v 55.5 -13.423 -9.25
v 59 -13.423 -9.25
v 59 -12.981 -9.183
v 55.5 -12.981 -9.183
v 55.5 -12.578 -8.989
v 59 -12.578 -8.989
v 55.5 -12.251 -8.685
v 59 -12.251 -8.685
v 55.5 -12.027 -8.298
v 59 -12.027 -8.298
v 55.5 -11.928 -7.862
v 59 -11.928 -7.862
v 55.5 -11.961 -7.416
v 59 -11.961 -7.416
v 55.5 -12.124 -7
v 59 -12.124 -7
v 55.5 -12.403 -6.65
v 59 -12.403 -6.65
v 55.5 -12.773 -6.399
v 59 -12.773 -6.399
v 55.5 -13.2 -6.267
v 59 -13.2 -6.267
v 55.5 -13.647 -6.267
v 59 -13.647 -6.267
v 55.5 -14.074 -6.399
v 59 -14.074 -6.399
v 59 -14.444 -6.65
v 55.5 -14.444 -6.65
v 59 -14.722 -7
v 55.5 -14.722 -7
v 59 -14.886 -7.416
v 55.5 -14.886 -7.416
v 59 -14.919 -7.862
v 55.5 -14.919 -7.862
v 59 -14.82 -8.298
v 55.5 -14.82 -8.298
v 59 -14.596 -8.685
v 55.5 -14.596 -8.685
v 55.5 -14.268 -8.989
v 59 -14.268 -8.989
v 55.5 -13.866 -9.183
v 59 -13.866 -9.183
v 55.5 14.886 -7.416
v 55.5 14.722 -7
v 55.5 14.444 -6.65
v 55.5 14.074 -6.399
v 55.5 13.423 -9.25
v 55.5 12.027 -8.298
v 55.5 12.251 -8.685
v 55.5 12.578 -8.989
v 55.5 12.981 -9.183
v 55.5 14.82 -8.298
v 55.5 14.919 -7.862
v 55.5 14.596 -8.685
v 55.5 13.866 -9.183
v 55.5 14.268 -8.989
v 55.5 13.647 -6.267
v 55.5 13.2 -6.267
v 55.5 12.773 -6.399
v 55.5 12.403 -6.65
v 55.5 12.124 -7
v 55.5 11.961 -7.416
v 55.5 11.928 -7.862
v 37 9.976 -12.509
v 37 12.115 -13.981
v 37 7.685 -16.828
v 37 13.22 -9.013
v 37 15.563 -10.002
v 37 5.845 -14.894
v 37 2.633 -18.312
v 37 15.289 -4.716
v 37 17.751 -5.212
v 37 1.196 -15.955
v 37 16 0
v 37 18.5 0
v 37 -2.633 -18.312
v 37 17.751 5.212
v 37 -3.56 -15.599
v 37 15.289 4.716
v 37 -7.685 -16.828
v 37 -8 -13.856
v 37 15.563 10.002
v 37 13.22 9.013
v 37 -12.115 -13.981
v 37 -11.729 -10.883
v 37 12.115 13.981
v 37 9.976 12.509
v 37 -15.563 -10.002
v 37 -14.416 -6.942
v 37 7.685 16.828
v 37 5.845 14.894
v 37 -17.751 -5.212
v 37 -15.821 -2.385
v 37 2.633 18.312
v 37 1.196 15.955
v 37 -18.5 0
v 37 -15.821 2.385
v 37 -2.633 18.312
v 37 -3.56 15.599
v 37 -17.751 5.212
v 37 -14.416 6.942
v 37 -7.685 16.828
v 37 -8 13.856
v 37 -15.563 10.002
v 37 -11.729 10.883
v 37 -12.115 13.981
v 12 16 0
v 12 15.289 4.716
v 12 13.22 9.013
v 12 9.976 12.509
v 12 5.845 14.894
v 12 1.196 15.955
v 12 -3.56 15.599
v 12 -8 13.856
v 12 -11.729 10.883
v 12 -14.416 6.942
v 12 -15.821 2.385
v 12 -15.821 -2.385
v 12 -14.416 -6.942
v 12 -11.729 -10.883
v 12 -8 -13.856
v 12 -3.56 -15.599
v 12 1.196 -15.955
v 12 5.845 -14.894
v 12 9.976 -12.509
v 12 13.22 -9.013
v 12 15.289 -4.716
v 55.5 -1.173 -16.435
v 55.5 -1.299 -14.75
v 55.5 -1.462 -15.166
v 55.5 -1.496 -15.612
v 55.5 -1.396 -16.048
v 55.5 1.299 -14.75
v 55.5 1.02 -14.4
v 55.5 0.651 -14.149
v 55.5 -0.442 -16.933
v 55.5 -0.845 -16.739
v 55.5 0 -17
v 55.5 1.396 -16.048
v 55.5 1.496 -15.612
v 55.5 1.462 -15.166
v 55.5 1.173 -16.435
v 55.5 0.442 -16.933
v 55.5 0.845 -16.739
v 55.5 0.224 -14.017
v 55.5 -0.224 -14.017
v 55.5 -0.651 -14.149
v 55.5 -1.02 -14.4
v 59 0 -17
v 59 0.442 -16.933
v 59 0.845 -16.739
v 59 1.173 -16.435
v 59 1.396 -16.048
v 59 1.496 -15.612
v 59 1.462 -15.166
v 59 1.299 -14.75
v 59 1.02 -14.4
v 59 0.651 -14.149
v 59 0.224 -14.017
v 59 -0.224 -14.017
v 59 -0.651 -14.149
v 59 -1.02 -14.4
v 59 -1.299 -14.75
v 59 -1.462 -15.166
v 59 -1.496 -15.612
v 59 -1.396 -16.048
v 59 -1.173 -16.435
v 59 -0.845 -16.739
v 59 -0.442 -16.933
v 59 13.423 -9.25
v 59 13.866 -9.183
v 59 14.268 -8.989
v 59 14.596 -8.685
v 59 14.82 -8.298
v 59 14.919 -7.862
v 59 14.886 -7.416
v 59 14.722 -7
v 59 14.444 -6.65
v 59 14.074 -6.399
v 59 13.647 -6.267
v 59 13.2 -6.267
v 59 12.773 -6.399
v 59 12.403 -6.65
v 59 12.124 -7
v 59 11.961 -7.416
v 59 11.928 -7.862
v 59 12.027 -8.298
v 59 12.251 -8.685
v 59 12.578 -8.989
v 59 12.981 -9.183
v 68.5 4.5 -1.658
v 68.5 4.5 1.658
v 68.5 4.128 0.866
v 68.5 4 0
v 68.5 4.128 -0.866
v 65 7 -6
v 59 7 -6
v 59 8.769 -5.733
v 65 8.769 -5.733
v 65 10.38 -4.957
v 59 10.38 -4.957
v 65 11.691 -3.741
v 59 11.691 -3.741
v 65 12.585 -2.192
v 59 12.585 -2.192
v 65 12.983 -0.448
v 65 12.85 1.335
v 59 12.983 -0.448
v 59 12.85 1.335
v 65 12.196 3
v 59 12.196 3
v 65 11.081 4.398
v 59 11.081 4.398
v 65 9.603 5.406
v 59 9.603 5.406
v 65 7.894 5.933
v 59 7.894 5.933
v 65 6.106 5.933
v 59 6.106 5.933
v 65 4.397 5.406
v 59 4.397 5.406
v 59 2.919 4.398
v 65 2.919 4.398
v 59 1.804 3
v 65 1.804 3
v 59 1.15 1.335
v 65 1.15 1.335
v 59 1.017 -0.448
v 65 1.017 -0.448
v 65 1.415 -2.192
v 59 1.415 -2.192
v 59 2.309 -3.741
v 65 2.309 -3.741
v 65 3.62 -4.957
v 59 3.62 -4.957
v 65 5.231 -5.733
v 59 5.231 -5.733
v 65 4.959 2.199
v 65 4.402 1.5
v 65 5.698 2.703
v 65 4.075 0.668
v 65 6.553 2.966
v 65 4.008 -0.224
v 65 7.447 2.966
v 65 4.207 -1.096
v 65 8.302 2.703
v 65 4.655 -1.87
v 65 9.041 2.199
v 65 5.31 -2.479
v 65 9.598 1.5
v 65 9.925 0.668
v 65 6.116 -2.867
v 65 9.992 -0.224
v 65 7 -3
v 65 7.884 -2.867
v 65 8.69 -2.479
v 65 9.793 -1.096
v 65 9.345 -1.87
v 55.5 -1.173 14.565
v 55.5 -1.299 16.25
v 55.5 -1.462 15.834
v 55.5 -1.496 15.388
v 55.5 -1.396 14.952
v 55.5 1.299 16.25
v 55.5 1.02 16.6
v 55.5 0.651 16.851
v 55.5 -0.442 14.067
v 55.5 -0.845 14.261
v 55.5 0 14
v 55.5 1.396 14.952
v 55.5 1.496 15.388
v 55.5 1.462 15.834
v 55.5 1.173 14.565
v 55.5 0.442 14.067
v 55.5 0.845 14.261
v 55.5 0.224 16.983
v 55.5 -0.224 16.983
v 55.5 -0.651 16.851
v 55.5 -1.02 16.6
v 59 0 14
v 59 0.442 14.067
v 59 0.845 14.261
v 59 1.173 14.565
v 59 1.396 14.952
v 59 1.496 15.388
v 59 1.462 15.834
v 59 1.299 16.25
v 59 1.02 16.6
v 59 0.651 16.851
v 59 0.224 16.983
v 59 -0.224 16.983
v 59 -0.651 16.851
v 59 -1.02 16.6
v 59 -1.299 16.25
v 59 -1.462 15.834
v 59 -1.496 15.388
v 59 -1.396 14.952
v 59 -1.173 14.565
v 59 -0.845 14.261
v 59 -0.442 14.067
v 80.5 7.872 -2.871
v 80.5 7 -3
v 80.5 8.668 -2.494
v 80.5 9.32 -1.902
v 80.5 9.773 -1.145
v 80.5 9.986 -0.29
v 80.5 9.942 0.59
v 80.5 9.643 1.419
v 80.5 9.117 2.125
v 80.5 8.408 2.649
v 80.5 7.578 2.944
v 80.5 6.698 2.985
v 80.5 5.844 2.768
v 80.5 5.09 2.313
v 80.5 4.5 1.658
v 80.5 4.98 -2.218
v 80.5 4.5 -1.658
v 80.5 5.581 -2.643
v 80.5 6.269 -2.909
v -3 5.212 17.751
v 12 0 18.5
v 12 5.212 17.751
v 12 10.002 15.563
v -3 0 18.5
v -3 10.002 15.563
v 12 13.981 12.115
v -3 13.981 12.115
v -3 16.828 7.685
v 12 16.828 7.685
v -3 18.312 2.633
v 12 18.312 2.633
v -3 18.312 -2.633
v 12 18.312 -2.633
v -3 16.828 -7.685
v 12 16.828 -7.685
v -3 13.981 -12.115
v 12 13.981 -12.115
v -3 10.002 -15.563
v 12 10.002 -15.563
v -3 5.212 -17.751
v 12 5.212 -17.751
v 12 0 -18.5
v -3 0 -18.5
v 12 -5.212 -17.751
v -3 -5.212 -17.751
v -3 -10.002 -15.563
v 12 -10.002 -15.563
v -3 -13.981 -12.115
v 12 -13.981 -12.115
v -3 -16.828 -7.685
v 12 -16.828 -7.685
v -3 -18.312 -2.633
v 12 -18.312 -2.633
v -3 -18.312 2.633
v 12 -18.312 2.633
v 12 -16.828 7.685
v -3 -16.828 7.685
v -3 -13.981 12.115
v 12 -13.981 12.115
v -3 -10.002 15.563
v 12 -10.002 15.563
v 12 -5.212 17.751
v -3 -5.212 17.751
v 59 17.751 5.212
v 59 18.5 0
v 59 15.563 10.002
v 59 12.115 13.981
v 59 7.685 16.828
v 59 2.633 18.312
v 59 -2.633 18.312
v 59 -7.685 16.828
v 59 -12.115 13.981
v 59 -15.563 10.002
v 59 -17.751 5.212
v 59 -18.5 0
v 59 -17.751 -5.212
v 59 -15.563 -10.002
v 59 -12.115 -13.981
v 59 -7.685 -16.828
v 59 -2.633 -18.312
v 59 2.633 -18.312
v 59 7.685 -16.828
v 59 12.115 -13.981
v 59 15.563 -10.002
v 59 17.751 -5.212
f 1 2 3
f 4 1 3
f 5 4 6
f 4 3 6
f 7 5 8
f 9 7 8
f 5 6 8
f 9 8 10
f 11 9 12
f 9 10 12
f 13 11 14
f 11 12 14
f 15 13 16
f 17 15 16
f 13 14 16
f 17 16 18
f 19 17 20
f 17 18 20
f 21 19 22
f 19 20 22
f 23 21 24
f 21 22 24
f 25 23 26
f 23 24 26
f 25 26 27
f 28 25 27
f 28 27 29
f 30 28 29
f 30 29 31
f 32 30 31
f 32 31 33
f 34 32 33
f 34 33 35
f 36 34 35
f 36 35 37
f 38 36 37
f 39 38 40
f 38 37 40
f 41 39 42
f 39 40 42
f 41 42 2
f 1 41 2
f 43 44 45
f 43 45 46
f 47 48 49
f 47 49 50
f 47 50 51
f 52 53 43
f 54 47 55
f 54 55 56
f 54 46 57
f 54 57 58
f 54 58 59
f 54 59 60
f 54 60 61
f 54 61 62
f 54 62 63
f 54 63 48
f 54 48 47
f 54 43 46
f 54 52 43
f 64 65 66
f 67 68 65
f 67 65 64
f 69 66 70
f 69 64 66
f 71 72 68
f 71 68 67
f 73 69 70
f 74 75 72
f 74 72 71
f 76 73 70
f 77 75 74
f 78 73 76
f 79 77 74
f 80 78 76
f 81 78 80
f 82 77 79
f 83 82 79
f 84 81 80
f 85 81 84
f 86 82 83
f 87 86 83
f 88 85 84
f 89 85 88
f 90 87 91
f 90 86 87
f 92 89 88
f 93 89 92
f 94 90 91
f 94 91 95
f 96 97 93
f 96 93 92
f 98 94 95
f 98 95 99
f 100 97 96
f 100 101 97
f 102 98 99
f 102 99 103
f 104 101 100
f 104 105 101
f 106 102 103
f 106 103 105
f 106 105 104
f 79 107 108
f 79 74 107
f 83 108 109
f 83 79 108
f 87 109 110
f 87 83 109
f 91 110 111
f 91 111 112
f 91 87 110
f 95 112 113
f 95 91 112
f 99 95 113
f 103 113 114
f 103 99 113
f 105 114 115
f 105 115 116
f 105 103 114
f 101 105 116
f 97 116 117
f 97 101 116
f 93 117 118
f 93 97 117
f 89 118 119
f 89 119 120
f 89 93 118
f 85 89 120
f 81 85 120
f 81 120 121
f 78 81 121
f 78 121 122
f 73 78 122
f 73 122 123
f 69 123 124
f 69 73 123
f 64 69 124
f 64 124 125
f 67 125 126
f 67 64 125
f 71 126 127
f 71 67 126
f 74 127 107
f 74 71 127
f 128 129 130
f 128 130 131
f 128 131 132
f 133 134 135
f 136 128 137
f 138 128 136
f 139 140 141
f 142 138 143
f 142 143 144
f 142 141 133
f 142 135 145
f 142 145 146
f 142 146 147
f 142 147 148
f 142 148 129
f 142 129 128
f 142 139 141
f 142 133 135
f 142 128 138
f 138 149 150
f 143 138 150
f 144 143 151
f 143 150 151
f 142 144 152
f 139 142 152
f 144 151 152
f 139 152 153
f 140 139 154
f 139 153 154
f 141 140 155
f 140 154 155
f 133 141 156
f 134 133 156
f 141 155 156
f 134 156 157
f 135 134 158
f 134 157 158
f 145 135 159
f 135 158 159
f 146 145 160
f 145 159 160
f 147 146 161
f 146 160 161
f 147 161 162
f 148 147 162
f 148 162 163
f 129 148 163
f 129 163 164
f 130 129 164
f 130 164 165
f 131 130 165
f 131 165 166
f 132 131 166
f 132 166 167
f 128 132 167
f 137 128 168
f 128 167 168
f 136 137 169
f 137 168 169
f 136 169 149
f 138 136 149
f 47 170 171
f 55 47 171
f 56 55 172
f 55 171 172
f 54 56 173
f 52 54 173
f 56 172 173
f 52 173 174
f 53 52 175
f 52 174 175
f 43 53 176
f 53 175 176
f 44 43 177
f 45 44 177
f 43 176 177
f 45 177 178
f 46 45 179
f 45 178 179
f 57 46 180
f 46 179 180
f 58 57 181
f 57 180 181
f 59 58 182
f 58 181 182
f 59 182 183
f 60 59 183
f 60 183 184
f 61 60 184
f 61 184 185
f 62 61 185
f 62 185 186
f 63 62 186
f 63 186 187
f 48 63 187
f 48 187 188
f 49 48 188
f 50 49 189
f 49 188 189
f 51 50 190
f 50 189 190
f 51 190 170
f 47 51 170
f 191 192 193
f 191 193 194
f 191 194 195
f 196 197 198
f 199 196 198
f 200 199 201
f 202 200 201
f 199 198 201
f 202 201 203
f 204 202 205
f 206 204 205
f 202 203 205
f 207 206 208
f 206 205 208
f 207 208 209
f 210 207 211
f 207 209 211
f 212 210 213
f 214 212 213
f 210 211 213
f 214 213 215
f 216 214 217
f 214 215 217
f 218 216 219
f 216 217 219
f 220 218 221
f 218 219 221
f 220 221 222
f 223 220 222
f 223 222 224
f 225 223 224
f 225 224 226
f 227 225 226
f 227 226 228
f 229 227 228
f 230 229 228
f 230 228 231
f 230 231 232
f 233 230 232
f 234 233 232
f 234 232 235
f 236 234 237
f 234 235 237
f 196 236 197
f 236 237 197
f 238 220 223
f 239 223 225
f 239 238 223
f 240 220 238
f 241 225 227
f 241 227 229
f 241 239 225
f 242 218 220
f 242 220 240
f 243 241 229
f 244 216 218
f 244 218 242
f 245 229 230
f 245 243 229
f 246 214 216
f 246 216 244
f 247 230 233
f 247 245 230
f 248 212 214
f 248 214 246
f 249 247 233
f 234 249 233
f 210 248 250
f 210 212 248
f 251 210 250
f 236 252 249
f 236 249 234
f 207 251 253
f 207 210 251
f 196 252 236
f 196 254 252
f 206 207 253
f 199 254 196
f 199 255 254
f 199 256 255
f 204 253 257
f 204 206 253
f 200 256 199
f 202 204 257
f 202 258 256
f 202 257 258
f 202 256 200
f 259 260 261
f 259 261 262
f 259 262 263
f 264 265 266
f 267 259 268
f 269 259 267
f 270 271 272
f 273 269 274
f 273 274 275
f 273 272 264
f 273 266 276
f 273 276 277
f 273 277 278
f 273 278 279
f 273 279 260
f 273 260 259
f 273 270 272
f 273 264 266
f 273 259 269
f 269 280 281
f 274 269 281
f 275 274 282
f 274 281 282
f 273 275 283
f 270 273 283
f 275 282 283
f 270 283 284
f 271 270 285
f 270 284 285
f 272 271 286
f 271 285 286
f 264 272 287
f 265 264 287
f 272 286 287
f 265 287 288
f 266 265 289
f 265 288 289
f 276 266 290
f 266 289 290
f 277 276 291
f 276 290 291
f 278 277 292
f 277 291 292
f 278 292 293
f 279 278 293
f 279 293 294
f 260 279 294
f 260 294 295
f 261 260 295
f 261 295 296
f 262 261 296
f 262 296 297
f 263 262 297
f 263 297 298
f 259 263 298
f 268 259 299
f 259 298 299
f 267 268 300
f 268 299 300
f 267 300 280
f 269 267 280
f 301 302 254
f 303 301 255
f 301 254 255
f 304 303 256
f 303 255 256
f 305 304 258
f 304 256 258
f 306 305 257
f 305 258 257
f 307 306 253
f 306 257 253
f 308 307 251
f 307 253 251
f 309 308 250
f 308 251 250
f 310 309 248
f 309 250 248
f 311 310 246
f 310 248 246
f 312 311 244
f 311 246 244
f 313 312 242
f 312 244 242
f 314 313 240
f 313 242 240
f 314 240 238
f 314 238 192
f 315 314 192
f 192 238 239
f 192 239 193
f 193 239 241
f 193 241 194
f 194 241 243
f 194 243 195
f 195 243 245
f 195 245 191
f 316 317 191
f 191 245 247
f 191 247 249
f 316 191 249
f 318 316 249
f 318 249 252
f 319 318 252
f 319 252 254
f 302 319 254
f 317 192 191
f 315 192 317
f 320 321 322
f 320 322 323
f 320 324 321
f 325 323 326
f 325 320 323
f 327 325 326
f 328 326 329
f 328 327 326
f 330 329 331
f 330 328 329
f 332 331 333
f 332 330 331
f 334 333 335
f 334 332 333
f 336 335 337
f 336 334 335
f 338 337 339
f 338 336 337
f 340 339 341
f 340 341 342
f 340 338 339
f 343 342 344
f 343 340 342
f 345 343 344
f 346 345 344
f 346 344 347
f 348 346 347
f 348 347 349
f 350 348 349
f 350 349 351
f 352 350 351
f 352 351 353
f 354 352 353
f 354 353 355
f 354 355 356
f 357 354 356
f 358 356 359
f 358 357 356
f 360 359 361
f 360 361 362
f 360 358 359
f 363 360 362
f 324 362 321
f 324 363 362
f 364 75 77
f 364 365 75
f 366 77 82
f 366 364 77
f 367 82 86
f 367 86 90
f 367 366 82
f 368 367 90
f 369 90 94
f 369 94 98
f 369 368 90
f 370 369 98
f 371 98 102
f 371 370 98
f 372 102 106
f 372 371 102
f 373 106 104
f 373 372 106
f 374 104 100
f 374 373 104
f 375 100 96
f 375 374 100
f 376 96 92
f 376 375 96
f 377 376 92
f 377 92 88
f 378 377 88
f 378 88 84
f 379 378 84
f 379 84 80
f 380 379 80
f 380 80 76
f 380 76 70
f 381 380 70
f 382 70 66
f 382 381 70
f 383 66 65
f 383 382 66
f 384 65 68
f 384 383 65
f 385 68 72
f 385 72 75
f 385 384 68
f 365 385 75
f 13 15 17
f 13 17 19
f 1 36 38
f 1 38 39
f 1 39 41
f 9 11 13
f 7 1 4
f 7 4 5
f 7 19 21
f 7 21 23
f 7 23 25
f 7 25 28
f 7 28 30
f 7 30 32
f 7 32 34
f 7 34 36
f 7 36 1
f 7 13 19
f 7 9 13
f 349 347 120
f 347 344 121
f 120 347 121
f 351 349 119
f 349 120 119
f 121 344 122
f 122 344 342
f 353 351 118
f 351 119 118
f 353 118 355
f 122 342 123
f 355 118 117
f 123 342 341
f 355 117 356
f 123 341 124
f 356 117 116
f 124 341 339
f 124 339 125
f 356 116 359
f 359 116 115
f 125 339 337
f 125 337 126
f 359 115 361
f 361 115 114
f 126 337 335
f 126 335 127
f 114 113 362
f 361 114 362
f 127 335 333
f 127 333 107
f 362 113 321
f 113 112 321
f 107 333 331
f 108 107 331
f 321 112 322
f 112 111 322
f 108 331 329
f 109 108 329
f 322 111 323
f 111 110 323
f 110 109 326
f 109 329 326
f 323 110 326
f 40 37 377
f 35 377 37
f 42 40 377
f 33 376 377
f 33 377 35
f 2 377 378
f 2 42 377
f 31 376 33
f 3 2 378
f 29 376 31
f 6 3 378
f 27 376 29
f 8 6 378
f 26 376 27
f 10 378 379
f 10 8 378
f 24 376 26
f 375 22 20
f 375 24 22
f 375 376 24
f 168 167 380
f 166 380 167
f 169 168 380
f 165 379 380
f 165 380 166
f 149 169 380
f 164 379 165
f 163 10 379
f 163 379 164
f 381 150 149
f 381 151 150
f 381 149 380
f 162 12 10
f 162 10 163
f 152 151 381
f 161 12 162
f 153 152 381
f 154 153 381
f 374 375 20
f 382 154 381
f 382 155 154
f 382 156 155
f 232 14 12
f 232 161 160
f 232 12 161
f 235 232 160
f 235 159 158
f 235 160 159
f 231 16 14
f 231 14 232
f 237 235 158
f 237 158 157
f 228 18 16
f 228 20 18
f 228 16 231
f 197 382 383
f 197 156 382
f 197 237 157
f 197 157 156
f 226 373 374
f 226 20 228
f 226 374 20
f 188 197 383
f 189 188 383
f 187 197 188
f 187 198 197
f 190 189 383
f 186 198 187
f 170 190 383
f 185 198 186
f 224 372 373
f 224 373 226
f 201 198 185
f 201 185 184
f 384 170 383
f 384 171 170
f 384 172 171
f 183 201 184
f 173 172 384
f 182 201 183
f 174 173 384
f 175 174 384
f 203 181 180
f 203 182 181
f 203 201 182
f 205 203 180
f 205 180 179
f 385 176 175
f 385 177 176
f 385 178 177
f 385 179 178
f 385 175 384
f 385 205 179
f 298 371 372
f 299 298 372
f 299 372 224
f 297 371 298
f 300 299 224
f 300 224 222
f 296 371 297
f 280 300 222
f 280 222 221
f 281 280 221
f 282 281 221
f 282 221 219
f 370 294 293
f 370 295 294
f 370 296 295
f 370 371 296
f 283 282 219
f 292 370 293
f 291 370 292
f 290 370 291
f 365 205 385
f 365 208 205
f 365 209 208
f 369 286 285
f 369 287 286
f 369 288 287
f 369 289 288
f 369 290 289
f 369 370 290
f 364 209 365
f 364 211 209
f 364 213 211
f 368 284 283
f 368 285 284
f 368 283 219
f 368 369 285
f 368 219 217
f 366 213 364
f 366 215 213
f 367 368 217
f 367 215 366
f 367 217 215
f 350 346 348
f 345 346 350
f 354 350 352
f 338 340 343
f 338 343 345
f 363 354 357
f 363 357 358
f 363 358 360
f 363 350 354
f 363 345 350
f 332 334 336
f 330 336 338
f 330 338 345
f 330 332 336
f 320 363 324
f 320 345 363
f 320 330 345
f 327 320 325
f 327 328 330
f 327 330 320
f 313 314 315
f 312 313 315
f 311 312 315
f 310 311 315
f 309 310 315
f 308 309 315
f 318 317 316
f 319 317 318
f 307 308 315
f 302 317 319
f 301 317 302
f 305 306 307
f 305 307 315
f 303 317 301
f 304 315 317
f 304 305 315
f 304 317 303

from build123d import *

# Parameters (mm, degrees)
ESQUISSE2_R             = 6
BOSS_EXTRU_1_DEPTH      = 6
ESQUISSE3_R             = 3
BOSS_EXTRU_2_DEPTH      = 15.5
ESQUISSE4_W             = 12
ESQUISSE4_H             = 0.5
ENL_V_MAT_EXTRU_1_DEPTH = 7.75
ESQUISSE5_R             = 1.5
ENL_V_MAT_EXTRU_2_DEPTH = 3.5
ESQUISSE6_W             = 3
ESQUISSE6_H             = 1
BOSS_EXTRU_3_DEPTH      = 4
ESQUISSE7_R             = 18.5
BOSS_EXTRU_4_DEPTH      = 10
BOSS_EXTRU_4_DEPTH_BACK = 5


with BuildPart() as part:
    # Esquisse1 → Révolution1 (revolve)
    with BuildSketch(Plane.XY):
        Polygon((0, 0), (0, 7), (7, 7), (7, 16), (37, 16), (37, 18.5), (59, 18.5), (59, 0), align=None)
    revolve(axis=Axis((0, 0, 0), (1, 0, 0)))

    # Esquisse2 → Boss.-Extru.1 (add)
    with BuildSketch(Plane(origin=(59, 0, 0), x_dir=(0, 0, -1), z_dir=(1, 0, 0))):
        with Locations((0, 7)):
            Circle(ESQUISSE2_R)
    extrude(amount=BOSS_EXTRU_1_DEPTH)

    # Esquisse3 → Boss.-Extru.2 (add)
    with BuildSketch(Plane(origin=(65, 0, 0), x_dir=(0, 0, -1), z_dir=(1, 0, 0))):
        with Locations((0, 7)):
            Circle(ESQUISSE3_R)
    extrude(amount=BOSS_EXTRU_2_DEPTH)

    # Esquisse4 → Enlèv. mat.-Extru.1 (cut, symmetric)
    with BuildSketch(Plane.XY):
        with Locations((74.5, 4.25)):
            Rectangle(ESQUISSE4_W, ESQUISSE4_H)
    extrude(amount=ENL_V_MAT_EXTRU_1_DEPTH, both=True, mode=Mode.SUBTRACT)

    # Esquisse5 → Enlèv. mat.-Extru.2 (cut)
    with BuildSketch(Plane(origin=(59, 0, 0), x_dir=(0, 0, -1), z_dir=(1, 0, 0))):
        with Locations((15.5, 0)):
            Circle(ESQUISSE5_R)
        with Locations((7.75, 13.423393759)):
            Circle(ESQUISSE5_R)
        with Locations((7.75, -13.423393759)):
            Circle(ESQUISSE5_R)
        with Locations((-15.5, 0)):
            Circle(ESQUISSE5_R)
    extrude(amount=-ENL_V_MAT_EXTRU_2_DEPTH, mode=Mode.SUBTRACT)

    # Esquisse6 → Boss.-Extru.3 (add)
    with BuildSketch(Plane.ZY.offset(-7)):
        with Locations((0, 12.939057981)):
            Rectangle(ESQUISSE6_W, ESQUISSE6_H)
        with Locations((0, -12.939057981)):
            Rectangle(ESQUISSE6_W, ESQUISSE6_H)
    extrude(amount=BOSS_EXTRU_3_DEPTH)

    # Esquisse7 → Boss.-Extru.4 (add, two sides)
    with BuildSketch(Plane.ZY.offset(-7)) as boss_extru_4_sk:
        Circle(ESQUISSE7_R)
    extrude(amount=BOSS_EXTRU_4_DEPTH)
    extrude(boss_extru_4_sk.sketch, amount=-BOSS_EXTRU_4_DEPTH_BACK)


solid = part.part
